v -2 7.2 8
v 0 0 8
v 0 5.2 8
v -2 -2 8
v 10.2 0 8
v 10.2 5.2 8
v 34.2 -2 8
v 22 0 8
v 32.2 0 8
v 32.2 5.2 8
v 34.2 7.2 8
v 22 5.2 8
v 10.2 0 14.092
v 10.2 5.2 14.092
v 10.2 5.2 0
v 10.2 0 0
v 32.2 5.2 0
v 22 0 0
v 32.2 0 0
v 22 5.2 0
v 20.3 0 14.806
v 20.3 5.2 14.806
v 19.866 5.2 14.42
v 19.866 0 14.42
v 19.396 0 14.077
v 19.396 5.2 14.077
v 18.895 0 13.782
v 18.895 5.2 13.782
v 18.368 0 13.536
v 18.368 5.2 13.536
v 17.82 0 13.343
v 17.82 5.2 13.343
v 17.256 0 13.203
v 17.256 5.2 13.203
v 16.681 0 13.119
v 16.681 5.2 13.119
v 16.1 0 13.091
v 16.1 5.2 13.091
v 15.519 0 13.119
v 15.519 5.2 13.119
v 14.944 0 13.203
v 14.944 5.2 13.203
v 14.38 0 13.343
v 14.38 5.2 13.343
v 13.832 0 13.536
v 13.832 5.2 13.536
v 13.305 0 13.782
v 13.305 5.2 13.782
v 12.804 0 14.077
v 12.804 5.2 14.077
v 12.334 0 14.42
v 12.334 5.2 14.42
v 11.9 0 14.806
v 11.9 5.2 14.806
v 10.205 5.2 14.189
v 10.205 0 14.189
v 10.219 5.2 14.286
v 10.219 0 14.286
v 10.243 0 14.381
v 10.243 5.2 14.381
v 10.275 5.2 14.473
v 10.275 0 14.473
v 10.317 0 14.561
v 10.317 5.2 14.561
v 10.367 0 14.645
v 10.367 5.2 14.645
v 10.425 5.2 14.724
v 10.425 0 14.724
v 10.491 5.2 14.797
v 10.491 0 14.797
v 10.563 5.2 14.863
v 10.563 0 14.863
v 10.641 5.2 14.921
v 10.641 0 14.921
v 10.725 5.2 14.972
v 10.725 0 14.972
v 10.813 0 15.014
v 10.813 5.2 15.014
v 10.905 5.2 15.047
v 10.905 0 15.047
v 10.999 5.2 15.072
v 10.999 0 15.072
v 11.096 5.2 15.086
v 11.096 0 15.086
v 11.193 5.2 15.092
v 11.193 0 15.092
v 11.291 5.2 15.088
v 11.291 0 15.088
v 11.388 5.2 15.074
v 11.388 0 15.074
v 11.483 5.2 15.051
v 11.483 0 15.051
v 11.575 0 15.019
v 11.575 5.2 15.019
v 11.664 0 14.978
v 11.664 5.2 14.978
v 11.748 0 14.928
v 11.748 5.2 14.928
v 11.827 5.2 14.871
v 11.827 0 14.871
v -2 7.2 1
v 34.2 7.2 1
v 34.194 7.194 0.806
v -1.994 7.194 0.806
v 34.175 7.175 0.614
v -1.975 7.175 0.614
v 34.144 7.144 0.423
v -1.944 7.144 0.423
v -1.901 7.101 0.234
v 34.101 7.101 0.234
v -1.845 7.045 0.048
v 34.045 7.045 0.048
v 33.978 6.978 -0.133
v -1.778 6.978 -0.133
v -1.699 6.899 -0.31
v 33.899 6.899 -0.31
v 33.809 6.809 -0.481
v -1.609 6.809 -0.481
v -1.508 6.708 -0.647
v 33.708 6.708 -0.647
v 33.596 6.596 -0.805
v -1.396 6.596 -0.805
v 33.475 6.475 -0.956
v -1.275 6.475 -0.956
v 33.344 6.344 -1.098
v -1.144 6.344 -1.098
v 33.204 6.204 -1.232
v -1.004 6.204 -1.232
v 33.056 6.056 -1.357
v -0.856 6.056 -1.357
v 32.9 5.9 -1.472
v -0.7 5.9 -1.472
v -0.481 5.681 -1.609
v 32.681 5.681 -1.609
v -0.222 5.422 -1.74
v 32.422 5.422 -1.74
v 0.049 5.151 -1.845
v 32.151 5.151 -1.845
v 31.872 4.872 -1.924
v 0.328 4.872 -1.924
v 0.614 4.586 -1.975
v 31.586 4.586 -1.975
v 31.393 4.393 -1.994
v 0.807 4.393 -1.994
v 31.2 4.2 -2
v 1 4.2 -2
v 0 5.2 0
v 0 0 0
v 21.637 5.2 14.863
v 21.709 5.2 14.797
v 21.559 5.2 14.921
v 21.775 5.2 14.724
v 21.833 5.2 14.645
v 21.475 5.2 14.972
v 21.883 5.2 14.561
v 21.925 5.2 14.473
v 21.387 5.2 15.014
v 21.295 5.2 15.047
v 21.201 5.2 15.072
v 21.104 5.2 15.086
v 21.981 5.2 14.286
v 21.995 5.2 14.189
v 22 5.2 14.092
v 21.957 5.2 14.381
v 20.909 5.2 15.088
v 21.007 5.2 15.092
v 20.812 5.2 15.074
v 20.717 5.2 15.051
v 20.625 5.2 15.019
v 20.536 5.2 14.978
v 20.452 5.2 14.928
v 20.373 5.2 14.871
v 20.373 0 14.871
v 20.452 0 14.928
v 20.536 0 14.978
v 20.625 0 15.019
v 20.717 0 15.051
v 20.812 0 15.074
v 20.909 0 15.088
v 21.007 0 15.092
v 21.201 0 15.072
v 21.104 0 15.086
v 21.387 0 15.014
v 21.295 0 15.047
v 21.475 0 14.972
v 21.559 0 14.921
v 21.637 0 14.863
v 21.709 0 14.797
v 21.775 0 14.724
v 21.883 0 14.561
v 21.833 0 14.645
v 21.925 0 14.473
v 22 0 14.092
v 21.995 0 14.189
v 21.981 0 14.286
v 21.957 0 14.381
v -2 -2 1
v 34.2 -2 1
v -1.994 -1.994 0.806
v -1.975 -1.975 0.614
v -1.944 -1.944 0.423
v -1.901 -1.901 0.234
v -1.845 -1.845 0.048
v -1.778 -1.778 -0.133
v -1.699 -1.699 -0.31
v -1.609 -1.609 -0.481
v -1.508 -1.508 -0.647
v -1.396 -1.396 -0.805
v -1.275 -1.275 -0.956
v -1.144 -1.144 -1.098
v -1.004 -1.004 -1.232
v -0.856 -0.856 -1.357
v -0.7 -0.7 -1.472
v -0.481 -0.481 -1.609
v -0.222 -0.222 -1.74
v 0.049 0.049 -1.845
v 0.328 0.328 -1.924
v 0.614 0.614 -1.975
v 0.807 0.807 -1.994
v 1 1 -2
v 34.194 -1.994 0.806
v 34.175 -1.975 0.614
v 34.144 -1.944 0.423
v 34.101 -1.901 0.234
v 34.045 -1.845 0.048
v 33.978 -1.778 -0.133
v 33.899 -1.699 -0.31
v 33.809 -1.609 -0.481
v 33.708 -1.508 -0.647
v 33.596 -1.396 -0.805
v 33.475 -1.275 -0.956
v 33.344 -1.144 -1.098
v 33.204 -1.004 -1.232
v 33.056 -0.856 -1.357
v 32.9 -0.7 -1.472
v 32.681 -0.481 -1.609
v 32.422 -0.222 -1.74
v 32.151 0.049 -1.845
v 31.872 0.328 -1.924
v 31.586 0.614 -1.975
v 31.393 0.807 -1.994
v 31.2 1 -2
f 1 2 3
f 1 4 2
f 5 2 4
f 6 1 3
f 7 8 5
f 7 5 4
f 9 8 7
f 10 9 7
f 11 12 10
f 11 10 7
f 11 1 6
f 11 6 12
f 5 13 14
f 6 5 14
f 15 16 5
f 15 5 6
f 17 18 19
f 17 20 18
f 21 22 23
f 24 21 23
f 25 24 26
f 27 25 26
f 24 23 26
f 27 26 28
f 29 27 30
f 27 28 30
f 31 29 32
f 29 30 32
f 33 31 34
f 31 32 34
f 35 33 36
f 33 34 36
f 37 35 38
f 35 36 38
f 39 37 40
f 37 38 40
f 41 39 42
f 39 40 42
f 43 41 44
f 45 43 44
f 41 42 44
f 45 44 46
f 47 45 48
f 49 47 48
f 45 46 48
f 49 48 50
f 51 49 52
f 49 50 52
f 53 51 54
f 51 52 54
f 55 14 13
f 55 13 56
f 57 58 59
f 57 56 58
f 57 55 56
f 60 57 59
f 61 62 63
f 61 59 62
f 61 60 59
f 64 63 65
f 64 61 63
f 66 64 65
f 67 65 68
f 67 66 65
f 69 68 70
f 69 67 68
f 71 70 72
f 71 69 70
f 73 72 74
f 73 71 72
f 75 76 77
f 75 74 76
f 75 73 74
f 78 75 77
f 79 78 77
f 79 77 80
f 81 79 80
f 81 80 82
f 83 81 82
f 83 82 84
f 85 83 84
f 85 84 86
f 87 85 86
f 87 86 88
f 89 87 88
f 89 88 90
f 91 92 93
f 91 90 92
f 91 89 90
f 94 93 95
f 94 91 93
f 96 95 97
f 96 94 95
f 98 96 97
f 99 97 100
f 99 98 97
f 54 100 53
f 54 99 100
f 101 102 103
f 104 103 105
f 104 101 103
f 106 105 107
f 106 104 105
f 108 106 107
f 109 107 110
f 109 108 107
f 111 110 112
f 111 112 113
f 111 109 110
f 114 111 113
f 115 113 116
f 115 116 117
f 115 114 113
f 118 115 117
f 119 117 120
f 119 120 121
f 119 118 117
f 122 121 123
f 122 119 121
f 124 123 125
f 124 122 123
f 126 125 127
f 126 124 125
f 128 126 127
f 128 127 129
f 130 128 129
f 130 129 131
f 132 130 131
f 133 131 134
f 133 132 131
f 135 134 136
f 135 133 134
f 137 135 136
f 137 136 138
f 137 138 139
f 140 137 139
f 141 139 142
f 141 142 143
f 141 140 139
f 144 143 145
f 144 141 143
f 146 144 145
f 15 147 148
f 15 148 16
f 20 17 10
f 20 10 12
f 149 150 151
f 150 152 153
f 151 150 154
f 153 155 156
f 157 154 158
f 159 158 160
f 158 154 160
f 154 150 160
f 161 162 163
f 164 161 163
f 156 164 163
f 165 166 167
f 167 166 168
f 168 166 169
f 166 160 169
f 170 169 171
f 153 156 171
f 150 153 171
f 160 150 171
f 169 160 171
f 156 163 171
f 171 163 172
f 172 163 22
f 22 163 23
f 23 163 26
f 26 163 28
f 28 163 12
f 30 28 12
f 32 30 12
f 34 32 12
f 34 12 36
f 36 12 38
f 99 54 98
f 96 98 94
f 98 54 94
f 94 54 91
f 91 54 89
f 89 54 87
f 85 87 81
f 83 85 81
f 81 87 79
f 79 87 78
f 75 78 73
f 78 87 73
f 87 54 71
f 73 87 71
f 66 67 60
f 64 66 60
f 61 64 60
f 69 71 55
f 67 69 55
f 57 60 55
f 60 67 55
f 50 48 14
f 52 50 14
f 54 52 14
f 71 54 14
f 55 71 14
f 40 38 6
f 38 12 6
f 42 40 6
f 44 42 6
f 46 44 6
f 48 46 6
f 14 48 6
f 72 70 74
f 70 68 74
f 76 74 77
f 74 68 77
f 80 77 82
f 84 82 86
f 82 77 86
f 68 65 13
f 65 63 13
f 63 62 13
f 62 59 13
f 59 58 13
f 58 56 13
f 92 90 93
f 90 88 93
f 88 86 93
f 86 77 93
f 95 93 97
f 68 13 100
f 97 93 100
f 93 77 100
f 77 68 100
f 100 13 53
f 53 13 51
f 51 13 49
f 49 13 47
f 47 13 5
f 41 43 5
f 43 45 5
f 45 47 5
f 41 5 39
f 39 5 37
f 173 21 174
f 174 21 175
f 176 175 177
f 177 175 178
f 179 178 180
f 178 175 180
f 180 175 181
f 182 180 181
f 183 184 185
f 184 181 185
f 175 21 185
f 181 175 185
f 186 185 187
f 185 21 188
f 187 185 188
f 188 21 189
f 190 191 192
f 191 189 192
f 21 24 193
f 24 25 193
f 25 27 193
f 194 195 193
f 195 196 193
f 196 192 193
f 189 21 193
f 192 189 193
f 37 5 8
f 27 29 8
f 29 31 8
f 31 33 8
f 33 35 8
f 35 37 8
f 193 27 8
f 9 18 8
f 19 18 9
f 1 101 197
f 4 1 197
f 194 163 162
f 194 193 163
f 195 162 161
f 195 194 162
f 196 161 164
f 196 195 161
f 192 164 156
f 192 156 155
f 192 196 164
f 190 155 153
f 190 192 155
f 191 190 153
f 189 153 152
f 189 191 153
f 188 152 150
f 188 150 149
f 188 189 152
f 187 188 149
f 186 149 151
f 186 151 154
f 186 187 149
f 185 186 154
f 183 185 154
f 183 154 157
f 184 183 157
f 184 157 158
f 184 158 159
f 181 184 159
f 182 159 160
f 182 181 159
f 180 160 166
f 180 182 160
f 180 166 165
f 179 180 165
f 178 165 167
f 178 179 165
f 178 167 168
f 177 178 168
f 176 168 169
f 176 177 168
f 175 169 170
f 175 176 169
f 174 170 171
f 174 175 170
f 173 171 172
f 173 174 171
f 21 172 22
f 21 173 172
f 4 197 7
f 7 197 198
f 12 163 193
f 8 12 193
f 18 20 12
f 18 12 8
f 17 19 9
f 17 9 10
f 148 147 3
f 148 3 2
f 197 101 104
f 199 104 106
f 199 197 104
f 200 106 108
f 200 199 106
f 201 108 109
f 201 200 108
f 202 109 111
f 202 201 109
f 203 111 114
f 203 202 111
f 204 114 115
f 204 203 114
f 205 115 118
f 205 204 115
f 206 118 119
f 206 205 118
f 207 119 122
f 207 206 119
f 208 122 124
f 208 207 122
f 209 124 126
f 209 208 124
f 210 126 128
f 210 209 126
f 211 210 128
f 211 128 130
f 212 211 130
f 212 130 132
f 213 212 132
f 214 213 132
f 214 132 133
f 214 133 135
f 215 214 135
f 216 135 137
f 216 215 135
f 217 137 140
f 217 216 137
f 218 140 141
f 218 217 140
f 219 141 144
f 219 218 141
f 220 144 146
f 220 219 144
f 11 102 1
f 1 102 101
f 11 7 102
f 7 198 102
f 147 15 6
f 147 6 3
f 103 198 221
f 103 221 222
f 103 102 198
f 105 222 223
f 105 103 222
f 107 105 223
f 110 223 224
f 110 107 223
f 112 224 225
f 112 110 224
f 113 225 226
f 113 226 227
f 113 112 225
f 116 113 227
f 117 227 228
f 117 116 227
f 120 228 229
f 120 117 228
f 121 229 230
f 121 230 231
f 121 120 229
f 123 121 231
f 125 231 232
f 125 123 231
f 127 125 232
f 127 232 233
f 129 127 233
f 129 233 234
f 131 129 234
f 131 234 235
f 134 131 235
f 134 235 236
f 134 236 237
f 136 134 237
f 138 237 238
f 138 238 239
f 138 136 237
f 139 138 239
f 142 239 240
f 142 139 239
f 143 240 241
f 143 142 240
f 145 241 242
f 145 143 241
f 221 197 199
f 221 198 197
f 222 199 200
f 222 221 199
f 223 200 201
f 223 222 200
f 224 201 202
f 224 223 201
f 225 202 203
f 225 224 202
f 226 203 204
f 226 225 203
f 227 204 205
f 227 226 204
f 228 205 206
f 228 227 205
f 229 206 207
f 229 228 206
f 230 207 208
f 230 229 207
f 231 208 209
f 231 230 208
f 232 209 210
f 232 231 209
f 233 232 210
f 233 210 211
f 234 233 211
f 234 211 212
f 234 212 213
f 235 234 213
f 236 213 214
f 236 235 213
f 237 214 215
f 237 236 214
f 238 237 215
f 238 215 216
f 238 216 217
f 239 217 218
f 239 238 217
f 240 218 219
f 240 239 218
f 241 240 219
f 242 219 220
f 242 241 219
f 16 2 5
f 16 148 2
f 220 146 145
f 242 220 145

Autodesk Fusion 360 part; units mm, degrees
sketch "Sketch1" plane through (0, 0, 0) normal (0, 0, 1) x (1, 0, 0)
  line L0 (0, 0) -> (32.2, 0)
  line L1 (32.2, 0) -> (32.2, 5.2)
  line L2 (32.2, 5.2) -> (0, 5.2)
  line L3 (0, 5.2) -> (0, 0)
  line L4 (-2, -2) -> (34.2, -2)
  line L5 (34.2, -2) -> (34.2, 7.2)
  line L6 (34.2, 7.2) -> (-2, 7.2)
  line L7 (-2, 7.2) -> (-2, -2)
  line L8 (10.2, 5.2) -> (22, 5.2)
  line L9 (22, 5.2) -> (22, 0)
  line L10 (22, 0) -> (10.2, 0)
  line L11 (10.2, 0) -> (10.2, 5.2)
  dimension "d1" = 5.2
  dimension "d2" = 32.2
  dimension "d3" = 2
  dimension "d4" = 10.2
  dimension "d5" = 10.2
extrude "Extrude1" add sketch "Sketch1" along normal blind 8
extrude "Extrude2" add sketch "Sketch1" against normal blind 2 contours L0 L2 L3 L11 | L0 L2 L8 L9 L10 L11 | L0 L1 L2 L9 | L4 L5 L6 L7
extrude "Extrude3" add sketch "Sketch1" along normal blind 18 contours L0 L2 L8 L9 L10 L11
sketch "Sketch2" plane through (0, 5.2, 0) normal (0, 1, 0) x (-1, 0, 0)
  line L0 (-22, 8) -> (-10.2, 8)
  line L1 (-10.2, 8) -> (-10.2, 18)
  line L2 (-10.2, 18) -> (-22, 18)
  line L3 (-22, 18) -> (-22, 8)
  arc A0 (-22, 18) -> (-10.2, 18) centre (-16.1, 19.0909) ccw
  dimension "d19" = 6
extrude "Extrude4" cut sketch "Sketch2" against normal up to surface (5.2 mm away) contours L2 A0
fillet "Fillet1" radius 3 4 edges at (-2, 2.6, -2) (16.1, 7.2, -2) (34.2, 2.6, -2) (16.1, -2, -2)
fillet "Fillet3" radius 1 2 edges at (10.2, 2.6, 18) (22, 2.6, 18)
